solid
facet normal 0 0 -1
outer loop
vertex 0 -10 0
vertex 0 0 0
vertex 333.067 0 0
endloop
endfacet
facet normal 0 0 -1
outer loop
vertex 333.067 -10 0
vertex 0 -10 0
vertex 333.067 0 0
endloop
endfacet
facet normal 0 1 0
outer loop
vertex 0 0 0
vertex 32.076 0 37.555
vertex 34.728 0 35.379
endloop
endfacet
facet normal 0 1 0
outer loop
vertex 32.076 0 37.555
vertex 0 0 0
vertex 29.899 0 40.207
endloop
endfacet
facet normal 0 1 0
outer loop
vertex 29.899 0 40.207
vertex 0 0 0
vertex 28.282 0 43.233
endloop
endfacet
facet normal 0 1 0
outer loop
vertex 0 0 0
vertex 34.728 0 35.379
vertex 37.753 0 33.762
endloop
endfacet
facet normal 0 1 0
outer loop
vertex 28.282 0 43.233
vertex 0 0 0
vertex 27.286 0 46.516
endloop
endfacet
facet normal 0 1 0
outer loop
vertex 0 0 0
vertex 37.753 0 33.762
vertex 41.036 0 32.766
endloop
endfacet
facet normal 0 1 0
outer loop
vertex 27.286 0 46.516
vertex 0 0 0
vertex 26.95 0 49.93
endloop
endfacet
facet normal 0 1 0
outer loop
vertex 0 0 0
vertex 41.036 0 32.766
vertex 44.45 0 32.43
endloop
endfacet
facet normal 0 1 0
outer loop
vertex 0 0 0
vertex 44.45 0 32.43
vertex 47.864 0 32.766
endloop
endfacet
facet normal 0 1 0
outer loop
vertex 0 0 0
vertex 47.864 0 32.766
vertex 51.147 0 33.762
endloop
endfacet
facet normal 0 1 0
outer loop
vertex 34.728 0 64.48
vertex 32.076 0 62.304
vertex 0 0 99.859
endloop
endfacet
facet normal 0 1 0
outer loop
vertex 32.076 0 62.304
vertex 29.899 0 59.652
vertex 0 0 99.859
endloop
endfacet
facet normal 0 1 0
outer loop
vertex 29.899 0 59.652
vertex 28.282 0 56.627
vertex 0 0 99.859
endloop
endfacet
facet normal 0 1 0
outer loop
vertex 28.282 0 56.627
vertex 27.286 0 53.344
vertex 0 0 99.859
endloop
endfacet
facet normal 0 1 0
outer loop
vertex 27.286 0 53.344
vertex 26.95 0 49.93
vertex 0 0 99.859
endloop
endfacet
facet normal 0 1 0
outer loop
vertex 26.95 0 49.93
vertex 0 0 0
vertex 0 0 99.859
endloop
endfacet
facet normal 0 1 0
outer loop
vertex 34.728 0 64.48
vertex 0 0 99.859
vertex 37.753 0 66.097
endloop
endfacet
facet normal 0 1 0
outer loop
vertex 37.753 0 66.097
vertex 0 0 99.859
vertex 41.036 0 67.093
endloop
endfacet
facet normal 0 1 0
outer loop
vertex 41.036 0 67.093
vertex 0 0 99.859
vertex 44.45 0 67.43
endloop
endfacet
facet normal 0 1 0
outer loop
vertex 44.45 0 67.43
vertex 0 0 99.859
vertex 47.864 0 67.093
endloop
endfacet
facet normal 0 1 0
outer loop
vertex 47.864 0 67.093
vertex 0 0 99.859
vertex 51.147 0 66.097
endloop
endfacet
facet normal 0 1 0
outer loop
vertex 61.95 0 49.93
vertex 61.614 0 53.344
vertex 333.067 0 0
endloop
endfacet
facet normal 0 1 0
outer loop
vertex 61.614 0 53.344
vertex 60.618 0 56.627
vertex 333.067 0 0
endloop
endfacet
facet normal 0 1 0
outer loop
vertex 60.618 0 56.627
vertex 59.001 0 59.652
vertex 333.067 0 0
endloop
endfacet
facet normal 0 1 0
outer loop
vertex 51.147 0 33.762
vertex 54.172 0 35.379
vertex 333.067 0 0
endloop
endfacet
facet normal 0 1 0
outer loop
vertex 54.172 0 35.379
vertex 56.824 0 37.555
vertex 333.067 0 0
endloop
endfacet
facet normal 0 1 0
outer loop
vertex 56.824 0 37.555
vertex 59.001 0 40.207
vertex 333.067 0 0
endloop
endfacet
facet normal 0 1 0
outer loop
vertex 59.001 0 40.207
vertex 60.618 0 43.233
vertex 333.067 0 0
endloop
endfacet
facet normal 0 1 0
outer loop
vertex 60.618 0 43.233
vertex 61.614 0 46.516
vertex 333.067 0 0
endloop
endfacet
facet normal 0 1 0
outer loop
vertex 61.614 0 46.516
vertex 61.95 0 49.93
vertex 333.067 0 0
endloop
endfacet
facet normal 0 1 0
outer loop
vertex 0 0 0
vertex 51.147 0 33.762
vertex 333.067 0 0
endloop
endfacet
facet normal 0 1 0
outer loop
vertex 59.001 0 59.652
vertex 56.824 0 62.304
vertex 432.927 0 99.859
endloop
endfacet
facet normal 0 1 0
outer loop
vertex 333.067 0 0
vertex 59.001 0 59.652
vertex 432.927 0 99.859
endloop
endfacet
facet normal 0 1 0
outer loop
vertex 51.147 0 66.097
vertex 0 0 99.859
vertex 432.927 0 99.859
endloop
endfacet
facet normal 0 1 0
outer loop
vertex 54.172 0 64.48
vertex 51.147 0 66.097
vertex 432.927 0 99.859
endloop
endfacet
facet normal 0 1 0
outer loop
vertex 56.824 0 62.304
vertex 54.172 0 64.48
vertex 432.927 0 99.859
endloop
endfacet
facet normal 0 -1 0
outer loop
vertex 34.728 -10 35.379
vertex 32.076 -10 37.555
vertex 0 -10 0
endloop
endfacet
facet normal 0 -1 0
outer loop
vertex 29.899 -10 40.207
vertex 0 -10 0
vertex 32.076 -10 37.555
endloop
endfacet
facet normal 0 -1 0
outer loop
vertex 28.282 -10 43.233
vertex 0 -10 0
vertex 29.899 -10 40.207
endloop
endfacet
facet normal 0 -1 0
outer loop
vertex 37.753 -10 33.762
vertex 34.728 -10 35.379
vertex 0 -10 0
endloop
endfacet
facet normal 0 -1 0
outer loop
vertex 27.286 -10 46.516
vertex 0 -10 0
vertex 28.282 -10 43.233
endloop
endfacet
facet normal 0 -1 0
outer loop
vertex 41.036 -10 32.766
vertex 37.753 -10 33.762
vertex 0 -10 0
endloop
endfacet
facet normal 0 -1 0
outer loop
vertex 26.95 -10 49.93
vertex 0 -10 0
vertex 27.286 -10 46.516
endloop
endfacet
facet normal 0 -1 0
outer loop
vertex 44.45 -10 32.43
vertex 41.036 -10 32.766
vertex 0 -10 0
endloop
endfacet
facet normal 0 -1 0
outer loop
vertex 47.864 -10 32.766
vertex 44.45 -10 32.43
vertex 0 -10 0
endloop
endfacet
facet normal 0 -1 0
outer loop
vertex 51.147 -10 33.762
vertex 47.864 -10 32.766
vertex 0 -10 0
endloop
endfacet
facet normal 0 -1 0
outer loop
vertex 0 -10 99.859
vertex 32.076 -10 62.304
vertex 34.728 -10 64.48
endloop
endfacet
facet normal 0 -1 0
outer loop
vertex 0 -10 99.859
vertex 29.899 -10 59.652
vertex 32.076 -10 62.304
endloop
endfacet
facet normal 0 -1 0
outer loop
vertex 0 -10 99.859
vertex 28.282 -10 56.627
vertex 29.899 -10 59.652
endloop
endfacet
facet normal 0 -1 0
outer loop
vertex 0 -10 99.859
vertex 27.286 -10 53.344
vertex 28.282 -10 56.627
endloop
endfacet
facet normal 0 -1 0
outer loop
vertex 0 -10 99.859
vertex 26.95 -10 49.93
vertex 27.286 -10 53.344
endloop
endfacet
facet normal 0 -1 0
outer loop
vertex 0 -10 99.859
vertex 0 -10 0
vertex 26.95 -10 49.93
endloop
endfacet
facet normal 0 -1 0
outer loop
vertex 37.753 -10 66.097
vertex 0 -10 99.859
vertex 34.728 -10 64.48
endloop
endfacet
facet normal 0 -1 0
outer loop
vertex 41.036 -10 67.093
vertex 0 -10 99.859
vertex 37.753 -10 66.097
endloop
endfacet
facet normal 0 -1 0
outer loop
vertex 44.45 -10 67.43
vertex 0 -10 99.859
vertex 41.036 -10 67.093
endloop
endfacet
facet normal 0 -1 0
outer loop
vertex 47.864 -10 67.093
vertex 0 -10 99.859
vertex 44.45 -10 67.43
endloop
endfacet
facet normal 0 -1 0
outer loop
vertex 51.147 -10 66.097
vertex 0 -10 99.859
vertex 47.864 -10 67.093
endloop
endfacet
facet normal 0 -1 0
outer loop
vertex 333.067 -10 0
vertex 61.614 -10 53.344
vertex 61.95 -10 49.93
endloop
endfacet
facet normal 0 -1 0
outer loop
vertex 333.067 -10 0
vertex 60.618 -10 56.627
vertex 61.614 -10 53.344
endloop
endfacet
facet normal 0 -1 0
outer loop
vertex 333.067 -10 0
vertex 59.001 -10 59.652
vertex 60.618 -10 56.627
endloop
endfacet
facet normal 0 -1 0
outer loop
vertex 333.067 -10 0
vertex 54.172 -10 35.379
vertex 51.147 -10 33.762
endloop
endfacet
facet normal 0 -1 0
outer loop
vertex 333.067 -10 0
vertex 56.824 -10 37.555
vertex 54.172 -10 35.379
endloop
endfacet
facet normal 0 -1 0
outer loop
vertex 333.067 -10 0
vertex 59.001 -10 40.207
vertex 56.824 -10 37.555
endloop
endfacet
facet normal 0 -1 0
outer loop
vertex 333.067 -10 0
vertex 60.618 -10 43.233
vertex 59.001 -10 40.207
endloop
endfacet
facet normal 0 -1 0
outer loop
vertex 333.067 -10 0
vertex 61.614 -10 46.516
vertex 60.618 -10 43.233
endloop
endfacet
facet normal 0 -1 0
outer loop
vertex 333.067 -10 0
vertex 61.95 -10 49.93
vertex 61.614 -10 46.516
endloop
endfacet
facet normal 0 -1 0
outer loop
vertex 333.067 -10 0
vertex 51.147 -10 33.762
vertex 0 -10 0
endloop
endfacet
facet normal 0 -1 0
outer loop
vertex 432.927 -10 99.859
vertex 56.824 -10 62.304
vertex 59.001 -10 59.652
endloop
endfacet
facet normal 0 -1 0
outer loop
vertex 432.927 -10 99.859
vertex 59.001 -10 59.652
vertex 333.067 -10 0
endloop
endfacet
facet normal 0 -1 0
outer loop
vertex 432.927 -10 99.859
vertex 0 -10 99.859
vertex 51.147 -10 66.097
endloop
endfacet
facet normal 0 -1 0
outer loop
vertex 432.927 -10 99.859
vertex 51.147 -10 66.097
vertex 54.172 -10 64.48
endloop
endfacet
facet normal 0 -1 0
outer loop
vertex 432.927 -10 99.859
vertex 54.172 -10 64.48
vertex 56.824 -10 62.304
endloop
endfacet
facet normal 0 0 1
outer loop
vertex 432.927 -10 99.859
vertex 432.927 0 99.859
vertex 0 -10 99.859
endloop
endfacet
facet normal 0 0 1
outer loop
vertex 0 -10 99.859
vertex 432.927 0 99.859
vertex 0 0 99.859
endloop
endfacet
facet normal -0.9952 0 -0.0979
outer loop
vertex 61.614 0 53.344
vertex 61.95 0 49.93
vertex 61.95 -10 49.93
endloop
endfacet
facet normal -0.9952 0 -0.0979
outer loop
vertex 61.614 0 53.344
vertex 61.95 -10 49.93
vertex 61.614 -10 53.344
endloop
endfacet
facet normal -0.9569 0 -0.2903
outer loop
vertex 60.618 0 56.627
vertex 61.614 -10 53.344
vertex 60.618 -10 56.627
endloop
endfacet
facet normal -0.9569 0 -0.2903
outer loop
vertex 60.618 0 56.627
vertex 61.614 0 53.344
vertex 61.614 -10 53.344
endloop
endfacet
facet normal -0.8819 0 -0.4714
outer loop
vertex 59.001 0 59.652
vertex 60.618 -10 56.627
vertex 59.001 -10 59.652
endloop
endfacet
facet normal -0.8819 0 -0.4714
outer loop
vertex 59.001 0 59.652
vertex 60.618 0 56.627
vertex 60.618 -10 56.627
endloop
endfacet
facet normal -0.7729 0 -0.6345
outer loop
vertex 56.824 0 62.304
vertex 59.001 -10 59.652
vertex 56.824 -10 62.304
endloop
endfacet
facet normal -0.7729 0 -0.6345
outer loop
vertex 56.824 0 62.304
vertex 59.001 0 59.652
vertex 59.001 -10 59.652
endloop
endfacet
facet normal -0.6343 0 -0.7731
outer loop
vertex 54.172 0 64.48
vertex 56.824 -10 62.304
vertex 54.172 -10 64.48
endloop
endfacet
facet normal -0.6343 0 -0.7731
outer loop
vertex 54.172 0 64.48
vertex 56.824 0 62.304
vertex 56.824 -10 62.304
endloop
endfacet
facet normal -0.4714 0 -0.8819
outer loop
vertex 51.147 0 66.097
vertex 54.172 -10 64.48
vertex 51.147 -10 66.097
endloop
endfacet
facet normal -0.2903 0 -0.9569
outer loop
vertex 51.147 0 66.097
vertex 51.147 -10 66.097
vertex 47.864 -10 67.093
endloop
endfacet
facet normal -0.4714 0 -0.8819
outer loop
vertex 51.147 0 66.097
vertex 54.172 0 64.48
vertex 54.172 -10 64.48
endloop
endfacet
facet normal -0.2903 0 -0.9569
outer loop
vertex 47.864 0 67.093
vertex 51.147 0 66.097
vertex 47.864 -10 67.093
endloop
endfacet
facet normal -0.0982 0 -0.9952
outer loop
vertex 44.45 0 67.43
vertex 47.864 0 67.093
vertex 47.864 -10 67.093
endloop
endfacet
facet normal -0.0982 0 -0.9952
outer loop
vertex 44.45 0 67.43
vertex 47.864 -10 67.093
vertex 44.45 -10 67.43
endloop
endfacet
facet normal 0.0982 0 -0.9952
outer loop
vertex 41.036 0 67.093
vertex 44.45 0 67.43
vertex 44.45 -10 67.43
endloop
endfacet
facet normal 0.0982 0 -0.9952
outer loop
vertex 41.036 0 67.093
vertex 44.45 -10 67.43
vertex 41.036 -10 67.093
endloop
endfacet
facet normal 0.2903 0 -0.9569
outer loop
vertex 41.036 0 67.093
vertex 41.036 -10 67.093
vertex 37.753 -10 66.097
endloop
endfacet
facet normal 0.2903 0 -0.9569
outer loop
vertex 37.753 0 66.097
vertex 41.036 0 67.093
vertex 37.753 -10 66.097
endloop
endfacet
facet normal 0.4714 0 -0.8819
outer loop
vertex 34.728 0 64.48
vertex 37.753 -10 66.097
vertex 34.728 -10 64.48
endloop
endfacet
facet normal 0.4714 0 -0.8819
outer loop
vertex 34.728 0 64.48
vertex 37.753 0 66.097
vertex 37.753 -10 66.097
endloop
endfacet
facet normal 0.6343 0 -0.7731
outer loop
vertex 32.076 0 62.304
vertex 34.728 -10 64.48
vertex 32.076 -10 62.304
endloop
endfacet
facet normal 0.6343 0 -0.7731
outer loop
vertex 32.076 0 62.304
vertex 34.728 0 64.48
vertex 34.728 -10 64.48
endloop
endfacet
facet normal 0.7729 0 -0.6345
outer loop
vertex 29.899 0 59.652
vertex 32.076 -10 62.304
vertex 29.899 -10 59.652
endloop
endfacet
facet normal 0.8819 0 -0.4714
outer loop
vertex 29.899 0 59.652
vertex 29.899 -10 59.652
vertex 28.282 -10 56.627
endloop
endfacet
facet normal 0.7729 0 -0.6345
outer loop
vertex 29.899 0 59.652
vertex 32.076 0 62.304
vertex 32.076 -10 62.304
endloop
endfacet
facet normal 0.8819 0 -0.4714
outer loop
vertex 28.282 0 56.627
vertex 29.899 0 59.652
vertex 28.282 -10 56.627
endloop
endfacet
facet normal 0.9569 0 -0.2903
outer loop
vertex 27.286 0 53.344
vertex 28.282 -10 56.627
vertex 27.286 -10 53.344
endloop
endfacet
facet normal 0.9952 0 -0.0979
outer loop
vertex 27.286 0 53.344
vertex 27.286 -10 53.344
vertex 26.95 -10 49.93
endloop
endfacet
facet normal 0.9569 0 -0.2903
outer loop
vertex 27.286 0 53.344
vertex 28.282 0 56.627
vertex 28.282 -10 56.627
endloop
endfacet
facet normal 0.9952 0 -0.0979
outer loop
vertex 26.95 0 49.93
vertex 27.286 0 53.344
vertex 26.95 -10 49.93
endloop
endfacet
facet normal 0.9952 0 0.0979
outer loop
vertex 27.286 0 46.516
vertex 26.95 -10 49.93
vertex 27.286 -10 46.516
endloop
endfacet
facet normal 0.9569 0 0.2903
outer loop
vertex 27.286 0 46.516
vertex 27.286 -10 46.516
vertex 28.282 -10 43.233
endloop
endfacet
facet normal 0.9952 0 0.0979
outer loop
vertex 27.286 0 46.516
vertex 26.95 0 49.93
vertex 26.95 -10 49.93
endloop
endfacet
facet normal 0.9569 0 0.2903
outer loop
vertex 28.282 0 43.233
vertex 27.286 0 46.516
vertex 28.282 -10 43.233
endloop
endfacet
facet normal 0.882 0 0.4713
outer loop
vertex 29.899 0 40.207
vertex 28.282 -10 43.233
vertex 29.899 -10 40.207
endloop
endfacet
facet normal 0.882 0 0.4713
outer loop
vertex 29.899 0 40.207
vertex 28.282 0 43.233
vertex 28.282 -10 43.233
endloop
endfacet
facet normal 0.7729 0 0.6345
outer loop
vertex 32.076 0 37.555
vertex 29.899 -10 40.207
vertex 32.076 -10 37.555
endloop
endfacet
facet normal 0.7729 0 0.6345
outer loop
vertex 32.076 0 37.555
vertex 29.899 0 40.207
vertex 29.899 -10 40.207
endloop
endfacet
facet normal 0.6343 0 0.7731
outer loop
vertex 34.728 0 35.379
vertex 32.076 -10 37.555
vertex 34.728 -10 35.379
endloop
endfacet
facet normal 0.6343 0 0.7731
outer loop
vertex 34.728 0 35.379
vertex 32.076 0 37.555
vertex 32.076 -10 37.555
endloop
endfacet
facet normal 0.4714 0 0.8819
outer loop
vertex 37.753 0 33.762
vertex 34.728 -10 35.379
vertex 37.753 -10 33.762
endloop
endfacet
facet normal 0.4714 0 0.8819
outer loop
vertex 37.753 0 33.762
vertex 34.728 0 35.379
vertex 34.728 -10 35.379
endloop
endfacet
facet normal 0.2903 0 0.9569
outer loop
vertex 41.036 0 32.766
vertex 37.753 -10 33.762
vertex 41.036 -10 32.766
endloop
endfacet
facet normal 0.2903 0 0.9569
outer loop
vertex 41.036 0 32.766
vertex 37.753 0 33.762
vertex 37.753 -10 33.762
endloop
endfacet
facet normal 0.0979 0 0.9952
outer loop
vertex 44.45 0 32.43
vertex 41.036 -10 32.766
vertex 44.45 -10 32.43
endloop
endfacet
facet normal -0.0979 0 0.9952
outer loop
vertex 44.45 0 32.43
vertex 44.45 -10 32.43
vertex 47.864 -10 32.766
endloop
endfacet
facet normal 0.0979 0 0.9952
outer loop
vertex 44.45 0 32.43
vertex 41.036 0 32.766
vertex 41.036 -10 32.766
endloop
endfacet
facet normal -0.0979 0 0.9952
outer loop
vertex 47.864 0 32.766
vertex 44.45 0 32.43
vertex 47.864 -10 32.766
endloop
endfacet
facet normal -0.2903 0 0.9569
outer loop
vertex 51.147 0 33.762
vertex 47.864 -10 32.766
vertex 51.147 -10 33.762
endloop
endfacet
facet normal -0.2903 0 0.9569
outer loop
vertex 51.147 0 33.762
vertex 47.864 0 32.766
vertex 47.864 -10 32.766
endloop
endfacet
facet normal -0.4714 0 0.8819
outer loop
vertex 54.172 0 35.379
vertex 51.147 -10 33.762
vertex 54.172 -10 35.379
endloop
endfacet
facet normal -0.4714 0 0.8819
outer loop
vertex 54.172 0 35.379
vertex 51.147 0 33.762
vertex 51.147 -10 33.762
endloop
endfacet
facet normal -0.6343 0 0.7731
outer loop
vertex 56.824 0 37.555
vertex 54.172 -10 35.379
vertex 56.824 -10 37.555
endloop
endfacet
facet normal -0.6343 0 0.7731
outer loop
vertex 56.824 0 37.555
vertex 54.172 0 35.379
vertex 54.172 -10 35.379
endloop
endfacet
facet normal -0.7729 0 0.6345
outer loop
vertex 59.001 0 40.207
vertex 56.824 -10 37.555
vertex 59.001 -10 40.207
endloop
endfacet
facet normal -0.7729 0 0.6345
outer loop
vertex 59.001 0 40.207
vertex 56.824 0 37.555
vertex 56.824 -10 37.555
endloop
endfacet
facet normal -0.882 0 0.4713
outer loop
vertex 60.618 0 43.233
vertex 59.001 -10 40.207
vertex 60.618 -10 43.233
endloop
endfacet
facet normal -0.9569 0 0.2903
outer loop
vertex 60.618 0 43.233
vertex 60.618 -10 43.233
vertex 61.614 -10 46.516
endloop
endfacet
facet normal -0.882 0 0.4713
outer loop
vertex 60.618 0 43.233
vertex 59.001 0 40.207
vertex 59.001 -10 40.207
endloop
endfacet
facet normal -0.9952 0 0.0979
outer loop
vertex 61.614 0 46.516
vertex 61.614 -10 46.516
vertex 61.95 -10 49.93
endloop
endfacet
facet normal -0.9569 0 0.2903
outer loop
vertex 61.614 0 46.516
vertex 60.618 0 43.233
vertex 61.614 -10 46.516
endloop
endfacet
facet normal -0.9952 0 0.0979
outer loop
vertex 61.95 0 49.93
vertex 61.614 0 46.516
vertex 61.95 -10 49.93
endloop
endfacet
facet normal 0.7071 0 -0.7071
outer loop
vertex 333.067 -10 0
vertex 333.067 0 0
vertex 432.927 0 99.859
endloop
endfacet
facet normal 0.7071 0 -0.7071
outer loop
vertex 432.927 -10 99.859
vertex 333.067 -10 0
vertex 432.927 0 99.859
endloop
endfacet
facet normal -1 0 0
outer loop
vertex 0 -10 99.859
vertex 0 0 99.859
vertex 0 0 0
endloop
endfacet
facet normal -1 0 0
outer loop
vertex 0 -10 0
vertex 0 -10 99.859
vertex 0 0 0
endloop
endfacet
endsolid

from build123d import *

# Parameters (mm, degrees)
SKETCH_R  = 17.5
PAD_DEPTH = 10


with BuildPart() as part:
    # Sketch → Pad (new body)
    with BuildSketch(Plane.XZ):
        Polygon((333.067415, 0), (432.926608, 99.859193), (0, 99.859193), (0, 0), align=None)
        with Locations((44.45, 49.929597)):
            Circle(SKETCH_R, mode=Mode.SUBTRACT)
    extrude(amount=PAD_DEPTH)


solid = part.part
